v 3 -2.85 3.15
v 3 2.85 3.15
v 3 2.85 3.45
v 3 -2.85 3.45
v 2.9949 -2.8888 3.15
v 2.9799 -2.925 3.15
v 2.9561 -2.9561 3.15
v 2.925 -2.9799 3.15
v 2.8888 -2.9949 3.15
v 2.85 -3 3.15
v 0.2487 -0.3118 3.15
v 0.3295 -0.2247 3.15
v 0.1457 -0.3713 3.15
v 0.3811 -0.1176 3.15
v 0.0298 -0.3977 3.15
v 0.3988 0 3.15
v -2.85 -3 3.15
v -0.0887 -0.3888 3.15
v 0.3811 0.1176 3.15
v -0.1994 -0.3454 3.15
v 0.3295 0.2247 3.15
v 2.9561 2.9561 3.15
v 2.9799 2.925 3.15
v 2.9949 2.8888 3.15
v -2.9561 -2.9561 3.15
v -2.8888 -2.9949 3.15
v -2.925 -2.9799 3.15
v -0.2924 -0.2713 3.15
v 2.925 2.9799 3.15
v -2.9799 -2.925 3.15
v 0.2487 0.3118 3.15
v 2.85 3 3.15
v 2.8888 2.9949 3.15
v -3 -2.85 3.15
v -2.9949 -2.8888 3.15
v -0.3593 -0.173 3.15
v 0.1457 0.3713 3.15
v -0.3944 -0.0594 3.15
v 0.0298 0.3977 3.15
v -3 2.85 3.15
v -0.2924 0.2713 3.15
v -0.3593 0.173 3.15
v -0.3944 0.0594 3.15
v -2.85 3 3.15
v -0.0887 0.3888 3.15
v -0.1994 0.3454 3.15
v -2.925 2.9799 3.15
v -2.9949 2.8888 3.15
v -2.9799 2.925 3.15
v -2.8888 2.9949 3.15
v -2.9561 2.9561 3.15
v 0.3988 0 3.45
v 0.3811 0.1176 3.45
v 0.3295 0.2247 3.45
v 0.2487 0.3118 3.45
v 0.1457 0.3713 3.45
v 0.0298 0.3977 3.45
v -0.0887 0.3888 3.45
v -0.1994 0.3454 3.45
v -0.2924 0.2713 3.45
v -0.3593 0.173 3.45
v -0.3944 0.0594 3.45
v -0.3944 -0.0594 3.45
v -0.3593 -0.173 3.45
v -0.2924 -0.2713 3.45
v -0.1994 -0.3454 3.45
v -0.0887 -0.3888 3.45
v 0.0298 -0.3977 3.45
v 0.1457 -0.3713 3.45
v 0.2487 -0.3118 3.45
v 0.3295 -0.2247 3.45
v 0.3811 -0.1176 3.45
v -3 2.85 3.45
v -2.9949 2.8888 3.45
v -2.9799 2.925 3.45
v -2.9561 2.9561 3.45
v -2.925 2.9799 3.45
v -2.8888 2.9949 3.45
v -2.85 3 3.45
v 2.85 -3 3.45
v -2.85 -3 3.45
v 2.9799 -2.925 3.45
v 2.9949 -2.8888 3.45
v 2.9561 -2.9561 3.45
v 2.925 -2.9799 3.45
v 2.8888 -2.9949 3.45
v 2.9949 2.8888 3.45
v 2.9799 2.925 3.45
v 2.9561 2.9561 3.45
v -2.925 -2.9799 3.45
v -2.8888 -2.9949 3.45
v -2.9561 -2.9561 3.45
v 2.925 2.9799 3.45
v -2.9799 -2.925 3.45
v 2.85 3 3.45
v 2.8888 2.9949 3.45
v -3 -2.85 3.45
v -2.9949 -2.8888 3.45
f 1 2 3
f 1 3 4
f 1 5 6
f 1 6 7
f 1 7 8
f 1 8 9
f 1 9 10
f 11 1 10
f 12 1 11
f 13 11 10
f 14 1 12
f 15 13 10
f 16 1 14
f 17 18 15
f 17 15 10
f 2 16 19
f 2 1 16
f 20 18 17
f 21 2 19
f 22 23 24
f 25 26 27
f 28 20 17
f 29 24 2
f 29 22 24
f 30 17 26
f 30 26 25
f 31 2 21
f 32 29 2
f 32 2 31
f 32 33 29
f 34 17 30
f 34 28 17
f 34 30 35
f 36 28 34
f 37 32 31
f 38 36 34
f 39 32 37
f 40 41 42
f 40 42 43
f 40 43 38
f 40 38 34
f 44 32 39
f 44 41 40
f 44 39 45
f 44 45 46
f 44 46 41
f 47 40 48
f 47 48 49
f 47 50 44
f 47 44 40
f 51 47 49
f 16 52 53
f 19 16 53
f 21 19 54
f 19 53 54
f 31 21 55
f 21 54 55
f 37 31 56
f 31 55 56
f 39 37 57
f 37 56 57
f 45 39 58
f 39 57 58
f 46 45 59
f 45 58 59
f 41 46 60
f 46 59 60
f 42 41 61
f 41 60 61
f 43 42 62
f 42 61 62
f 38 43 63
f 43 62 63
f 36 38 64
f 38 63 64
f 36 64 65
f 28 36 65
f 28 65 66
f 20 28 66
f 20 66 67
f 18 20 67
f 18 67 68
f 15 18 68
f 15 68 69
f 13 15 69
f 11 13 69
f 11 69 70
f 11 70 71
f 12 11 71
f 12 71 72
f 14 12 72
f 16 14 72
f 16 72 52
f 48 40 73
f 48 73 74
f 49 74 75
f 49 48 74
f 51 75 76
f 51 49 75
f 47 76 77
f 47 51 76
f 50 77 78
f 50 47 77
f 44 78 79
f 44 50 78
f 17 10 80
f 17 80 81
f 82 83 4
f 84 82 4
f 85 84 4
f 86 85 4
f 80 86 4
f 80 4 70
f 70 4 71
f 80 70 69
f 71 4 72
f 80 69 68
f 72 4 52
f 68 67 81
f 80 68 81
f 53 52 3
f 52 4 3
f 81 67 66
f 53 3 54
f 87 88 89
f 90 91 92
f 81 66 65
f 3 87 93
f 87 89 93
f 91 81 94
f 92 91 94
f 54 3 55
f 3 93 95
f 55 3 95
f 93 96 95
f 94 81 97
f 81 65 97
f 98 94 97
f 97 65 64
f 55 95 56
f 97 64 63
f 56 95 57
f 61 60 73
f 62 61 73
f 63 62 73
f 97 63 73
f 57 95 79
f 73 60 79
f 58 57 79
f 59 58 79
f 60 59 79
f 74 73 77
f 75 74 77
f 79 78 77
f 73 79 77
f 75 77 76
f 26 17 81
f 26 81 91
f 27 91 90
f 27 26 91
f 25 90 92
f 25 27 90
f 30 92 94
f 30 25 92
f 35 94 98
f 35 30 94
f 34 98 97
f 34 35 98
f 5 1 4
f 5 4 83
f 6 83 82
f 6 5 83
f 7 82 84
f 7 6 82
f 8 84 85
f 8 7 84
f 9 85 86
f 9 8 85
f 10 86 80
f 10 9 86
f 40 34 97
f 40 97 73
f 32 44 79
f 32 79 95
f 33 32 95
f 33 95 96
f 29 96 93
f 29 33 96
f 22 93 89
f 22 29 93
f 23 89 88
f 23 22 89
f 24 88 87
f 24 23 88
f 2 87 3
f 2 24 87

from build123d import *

# Parameters (mm, degrees)
EXTRUDE_1_DEPTH     = 0.3
SKETCH_2_R          = 0.398831964
CUT_EXTRUDE_1_DEPTH = 10


with BuildPart() as part:
    # 草图1 → 凸台-拉伸1 (new body)
    with BuildSketch(Plane(origin=(0, 0, 3.15), x_dir=(-1, 0, 0), z_dir=(0, 0, -1))):
        with BuildLine():
            Line((-2.85, -3), (2.85, -3))
            ThreePointArc((2.85, -3), (2.956066017, -2.956066017), (3, -2.85))
            Line((3, -2.85), (3, 2.85))
            ThreePointArc((3, 2.85), (2.956066017, 2.956066017), (2.85, 3))
            Line((2.85, 3), (-2.85, 3))
            ThreePointArc((-2.85, 3), (-2.956066017, 2.956066017), (-3, 2.85))
            Line((-3, 2.85), (-3, -2.85))
            ThreePointArc((-3, -2.85), (-2.956066017, -2.956066017), (-2.85, -3))
        make_face()
    extrude(amount=-EXTRUDE_1_DEPTH)

    # 草图2 → 切除-拉伸1 (cut)
    with BuildSketch(Plane.XY.offset(3.45)):
        Circle(SKETCH_2_R)
    extrude(amount=-CUT_EXTRUDE_1_DEPTH, mode=Mode.SUBTRACT)


solid = part.part
